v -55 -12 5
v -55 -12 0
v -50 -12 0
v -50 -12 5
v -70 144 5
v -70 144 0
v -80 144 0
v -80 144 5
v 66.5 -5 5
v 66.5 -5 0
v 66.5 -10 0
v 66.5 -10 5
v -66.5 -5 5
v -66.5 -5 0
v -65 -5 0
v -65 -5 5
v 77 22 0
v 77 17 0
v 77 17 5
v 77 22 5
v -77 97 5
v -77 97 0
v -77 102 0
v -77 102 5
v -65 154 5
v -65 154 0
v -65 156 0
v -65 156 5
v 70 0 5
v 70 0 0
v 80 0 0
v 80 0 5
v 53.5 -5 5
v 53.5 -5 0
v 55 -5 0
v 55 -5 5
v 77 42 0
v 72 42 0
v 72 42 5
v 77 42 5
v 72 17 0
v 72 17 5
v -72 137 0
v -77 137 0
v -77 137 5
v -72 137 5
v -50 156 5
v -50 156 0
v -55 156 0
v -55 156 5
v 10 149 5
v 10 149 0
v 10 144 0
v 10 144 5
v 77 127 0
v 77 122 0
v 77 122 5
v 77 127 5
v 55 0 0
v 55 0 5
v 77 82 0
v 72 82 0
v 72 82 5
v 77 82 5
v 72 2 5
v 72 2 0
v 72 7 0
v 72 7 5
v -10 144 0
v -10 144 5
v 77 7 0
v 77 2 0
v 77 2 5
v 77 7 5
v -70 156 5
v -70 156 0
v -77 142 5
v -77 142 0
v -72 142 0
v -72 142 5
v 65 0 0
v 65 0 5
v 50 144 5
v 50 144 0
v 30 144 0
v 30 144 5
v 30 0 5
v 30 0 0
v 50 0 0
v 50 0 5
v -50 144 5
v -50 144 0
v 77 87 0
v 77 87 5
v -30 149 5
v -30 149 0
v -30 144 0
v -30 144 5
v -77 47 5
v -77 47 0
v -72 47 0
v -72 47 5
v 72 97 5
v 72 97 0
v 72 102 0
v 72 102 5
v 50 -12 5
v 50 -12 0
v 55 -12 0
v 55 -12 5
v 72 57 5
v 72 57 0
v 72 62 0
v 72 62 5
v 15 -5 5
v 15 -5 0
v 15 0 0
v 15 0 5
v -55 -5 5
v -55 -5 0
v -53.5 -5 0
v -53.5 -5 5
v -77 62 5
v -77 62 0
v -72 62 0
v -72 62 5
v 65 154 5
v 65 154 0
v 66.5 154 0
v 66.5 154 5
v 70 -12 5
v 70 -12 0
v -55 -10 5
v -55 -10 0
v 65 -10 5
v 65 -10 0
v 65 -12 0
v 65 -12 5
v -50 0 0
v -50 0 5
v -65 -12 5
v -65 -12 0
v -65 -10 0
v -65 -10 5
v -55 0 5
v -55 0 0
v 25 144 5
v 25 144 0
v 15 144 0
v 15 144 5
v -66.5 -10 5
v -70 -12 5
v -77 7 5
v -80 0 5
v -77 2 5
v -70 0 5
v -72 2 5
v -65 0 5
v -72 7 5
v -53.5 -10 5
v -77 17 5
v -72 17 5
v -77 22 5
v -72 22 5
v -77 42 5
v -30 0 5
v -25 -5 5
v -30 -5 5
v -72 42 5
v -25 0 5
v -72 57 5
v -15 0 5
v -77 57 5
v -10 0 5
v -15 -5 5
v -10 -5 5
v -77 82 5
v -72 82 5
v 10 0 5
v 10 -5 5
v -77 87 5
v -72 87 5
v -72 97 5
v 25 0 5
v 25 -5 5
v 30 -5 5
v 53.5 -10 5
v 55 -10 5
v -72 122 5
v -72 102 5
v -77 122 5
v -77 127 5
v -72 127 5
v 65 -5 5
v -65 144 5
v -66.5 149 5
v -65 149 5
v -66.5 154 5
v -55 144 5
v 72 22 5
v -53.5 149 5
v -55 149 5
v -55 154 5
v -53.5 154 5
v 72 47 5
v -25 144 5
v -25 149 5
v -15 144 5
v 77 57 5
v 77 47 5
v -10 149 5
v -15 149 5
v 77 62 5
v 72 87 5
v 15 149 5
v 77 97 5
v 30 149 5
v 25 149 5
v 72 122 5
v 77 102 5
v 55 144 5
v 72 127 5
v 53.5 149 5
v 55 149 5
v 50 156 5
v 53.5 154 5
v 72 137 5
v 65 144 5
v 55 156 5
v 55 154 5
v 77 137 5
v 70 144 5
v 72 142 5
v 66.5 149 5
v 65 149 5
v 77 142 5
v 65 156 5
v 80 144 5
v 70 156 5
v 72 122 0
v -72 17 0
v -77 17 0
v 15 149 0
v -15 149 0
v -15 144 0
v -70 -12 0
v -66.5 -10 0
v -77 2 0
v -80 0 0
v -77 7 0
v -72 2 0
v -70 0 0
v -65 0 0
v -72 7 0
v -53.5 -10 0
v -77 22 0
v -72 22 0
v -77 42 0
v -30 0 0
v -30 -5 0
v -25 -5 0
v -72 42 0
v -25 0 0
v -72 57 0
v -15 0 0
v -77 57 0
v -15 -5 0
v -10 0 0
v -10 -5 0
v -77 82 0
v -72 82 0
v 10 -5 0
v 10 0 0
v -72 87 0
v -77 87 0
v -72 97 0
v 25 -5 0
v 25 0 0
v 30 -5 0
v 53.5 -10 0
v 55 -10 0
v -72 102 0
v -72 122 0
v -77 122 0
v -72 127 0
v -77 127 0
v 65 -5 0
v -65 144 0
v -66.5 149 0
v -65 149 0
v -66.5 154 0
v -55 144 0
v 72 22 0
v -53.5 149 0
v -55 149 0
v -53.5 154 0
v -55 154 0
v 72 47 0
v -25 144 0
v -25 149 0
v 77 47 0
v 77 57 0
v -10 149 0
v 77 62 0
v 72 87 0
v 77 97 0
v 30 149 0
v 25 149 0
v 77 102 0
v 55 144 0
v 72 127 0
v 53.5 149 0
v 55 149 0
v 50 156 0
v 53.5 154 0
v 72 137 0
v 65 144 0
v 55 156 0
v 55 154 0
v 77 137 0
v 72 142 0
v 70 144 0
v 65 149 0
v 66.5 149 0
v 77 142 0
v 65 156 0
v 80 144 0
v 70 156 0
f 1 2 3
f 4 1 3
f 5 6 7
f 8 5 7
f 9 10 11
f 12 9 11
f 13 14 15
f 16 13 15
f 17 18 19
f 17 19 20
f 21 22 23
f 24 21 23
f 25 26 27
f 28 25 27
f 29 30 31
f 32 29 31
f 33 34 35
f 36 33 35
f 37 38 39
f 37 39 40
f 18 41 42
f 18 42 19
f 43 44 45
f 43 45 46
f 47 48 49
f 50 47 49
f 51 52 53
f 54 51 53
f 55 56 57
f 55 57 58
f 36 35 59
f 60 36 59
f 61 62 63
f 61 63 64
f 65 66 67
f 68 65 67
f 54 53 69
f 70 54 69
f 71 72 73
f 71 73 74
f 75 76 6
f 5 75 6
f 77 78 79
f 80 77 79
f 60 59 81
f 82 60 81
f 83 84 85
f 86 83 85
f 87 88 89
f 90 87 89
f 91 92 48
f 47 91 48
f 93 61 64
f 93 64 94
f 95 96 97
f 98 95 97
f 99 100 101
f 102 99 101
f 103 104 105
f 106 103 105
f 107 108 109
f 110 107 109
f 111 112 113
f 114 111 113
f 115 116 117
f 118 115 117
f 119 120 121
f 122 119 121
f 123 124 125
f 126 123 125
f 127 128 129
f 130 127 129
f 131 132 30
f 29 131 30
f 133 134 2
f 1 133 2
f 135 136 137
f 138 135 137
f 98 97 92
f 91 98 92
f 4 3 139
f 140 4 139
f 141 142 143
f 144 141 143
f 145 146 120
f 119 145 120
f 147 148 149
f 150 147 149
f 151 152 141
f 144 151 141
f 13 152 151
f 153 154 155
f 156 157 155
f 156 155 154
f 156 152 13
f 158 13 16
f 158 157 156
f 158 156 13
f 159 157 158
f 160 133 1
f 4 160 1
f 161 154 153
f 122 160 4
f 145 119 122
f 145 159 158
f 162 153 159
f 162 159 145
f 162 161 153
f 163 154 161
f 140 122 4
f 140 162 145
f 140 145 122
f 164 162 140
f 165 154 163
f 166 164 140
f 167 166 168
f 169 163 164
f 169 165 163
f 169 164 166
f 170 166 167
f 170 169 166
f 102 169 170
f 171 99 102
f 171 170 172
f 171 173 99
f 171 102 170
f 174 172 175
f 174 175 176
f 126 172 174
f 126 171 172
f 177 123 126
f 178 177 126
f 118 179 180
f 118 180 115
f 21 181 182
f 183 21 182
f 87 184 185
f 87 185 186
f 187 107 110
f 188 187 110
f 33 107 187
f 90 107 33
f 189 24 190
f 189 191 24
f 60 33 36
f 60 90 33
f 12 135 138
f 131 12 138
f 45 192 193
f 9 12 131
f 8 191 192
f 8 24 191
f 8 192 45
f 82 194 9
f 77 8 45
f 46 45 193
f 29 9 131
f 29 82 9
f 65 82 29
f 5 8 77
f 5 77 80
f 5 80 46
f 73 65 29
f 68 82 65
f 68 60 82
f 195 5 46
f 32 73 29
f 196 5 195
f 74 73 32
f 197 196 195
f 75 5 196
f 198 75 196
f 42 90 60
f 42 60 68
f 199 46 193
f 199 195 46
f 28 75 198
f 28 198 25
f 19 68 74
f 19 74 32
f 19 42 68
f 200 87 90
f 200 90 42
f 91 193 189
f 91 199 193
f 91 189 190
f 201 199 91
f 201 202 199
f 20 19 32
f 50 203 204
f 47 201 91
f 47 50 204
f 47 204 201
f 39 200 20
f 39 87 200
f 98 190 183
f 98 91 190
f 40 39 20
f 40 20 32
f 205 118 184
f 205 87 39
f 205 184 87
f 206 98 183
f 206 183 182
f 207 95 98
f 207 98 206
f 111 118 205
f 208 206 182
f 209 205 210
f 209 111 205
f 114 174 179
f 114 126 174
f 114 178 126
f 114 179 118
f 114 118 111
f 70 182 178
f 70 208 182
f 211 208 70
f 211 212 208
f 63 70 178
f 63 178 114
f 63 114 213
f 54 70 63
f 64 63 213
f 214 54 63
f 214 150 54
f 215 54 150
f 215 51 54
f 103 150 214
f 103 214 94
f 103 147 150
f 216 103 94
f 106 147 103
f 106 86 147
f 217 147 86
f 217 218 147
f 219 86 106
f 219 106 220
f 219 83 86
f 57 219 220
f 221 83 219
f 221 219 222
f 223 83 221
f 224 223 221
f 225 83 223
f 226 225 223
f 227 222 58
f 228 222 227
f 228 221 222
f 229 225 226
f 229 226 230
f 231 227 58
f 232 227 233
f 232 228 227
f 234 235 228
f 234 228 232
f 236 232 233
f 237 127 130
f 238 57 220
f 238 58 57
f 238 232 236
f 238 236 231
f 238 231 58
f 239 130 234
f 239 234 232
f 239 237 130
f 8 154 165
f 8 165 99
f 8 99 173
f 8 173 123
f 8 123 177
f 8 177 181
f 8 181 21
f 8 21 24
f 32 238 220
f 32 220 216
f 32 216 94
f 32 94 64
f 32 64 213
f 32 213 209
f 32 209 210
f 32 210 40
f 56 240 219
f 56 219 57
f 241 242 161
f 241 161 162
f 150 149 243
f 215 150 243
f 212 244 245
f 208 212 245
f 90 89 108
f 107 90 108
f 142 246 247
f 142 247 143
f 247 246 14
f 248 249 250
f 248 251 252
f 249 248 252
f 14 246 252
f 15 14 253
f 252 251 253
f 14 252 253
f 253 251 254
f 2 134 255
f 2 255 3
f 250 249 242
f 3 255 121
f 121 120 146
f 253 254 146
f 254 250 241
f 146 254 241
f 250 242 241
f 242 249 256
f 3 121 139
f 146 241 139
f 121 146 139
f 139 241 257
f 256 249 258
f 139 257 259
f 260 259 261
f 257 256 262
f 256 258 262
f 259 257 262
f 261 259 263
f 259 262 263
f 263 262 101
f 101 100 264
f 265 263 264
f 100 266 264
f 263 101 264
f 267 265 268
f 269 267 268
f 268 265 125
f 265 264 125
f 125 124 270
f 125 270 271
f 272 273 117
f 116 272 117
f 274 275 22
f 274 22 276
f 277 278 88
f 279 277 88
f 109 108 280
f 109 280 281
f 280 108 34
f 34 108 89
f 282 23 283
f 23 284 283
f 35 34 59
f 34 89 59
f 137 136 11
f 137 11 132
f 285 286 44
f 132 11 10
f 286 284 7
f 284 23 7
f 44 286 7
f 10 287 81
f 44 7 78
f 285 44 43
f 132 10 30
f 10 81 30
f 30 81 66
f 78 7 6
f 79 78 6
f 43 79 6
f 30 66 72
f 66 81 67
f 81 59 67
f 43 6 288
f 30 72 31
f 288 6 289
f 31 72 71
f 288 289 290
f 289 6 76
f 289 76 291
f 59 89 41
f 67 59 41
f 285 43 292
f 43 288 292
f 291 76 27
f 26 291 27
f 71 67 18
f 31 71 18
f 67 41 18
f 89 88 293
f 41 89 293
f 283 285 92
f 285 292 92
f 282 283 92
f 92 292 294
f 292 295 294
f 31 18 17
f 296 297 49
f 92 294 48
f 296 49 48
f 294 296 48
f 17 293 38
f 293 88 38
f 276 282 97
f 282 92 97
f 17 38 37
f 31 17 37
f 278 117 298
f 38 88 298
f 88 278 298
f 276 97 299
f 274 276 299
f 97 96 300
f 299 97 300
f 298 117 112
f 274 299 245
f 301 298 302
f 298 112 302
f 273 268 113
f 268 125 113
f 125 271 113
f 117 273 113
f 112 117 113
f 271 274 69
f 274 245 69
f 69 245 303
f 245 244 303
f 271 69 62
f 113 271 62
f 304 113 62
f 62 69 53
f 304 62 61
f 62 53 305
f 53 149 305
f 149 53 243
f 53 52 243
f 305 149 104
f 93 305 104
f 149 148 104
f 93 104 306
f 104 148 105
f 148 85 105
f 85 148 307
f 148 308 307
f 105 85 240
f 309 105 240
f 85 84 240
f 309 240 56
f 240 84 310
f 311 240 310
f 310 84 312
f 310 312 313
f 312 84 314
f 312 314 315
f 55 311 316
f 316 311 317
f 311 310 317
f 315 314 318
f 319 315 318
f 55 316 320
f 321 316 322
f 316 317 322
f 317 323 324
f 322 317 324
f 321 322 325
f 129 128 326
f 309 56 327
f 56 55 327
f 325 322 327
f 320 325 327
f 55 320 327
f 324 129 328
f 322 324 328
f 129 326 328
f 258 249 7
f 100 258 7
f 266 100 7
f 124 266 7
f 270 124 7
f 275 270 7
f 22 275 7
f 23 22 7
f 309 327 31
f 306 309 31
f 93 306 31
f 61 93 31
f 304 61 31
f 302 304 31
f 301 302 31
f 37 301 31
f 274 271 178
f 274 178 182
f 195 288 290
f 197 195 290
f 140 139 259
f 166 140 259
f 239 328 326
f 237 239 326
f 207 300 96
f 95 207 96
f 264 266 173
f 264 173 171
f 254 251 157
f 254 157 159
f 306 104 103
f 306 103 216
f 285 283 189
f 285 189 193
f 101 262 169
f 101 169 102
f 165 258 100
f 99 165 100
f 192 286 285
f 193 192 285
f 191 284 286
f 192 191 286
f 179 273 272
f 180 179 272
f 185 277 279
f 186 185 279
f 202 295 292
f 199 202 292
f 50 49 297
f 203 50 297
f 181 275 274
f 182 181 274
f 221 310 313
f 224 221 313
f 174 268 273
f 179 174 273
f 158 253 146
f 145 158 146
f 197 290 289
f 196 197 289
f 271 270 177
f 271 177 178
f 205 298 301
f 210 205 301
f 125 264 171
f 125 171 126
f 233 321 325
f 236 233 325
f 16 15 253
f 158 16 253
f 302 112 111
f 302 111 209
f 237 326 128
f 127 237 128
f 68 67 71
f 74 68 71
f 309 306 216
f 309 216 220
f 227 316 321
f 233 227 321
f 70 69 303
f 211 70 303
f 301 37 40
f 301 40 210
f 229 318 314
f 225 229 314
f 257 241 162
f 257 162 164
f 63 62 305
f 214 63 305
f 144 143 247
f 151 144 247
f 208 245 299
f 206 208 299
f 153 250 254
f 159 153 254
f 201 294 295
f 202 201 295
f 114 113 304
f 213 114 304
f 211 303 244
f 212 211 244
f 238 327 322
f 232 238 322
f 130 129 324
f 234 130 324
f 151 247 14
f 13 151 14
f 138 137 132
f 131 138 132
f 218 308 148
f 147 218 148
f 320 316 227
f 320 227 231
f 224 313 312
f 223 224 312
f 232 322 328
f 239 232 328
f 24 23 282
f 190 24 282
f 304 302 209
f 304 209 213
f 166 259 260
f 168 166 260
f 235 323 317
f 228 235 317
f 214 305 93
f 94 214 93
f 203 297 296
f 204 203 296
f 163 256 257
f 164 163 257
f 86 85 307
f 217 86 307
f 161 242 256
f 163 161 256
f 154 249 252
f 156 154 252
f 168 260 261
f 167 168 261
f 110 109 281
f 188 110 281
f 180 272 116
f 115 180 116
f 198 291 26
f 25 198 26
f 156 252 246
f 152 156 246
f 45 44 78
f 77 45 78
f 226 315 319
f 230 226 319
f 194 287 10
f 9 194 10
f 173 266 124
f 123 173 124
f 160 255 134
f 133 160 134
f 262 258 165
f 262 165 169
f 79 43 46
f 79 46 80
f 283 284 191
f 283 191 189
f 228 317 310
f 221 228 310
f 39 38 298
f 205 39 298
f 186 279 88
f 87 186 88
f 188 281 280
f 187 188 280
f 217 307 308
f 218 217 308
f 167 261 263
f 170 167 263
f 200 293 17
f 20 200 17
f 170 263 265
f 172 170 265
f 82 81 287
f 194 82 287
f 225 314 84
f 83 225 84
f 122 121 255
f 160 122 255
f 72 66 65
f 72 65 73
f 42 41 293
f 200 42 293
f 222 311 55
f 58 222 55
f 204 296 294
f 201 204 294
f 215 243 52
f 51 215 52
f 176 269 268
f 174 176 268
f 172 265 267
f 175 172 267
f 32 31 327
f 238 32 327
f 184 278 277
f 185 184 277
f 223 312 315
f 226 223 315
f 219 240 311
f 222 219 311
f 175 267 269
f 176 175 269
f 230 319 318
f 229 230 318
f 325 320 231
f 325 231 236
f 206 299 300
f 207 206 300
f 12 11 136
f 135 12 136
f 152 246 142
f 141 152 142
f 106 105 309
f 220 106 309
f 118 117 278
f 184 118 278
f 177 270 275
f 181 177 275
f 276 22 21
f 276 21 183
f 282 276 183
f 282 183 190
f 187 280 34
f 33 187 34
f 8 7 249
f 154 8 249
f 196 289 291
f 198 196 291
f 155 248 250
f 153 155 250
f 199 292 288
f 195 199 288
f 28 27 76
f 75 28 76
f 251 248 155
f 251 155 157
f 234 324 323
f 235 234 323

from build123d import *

# Parameters (mm, degrees)
ESQUISSE1_W        = 5
ESQUISSE1_H        = 5
BOSS_EXTRU_1_DEPTH = 5


with BuildPart() as part:
    # Esquisse1 → Boss.-Extru.1 (new body)
    with BuildSketch(Plane.XY):
        Polygon((-70, 144), (-80, 144), (-80, 0), (-70, 0), (-70, -5), (-70, -12), (-65, -12), (-65, -10), (-66.5, -10), (-66.5, -5), (-65, -5), (-65, 0), (-60, 0), (-55, 0), (-55, -5), (-53.5, -5), (-53.5, -10), (-55, -10), (-55, -12), (-50, -12), (-50, -5), (-50, 0), (-30, 0), (-30, -5), (-25, -5), (-25, 0), (-20, 0), (-15, 0), (-15, -5), (-10, -5), (-10, 0), (10, 0), (10, -5), (15, -5), (15, 0), (20, 0), (25, 0), (25, -5), (30, -5), (30, 0), (50, 0), (50, -5), (50, -12), (55, -12), (55, -10), (53.5, -10), (53.5, -5), (55, -5), (55, 0), (60, 0), (65, 0), (65, -5), (66.5, -5), (66.5, -10), (65, -10), (65, -12), (70, -12), (70, -5), (70, 0), (80, 0), (80, 144), (70, 144), (70, 149), (70, 156), (65, 156), (65, 154), (66.5, 154), (66.5, 149), (65, 149), (65, 144), (60, 144), (55, 144), (55, 149), (53.5, 149), (53.5, 154), (55, 154), (55, 156), (50, 156), (50, 149), (50, 144), (30, 144), (30, 149), (25, 149), (25, 144), (20, 144), (15, 144), (15, 149), (10, 149), (10, 144), (-10, 144), (-10, 149), (-15, 149), (-15, 144), (-20, 144), (-25, 144), (-25, 149), (-30, 149), (-30, 144), (-50, 144), (-50, 149), (-50, 156), (-55, 156), (-55, 154), (-53.5, 154), (-53.5, 149), (-55, 149), (-55, 144), (-60, 144), (-65, 144), (-65, 149), (-66.5, 149), (-66.5, 154), (-65, 154), (-65, 156), (-70, 156), (-70, 149), align=None)
        with Locations((-74.5, 4.5)):
            Rectangle(ESQUISSE1_W, ESQUISSE1_H, mode=Mode.SUBTRACT)
        with Locations((-74.5, 19.5)):
            Rectangle(ESQUISSE1_W, ESQUISSE1_H, mode=Mode.SUBTRACT)
        with Locations((-74.5, 44.5)):
            Rectangle(ESQUISSE1_W, ESQUISSE1_H, mode=Mode.SUBTRACT)
        with Locations((-74.5, 59.5)):
            Rectangle(ESQUISSE1_W, ESQUISSE1_H, mode=Mode.SUBTRACT)
        with Locations((74.5, 4.5)):
            Rectangle(ESQUISSE1_W, ESQUISSE1_H, mode=Mode.SUBTRACT)
        with Locations((74.5, 19.5)):
            Rectangle(ESQUISSE1_W, ESQUISSE1_H, mode=Mode.SUBTRACT)
        with Locations((74.5, 44.5)):
            Rectangle(ESQUISSE1_W, ESQUISSE1_H, mode=Mode.SUBTRACT)
        with Locations((74.5, 59.5)):
            Rectangle(ESQUISSE1_W, ESQUISSE1_H, mode=Mode.SUBTRACT)
        with Locations((-74.5, 84.5)):
            Rectangle(ESQUISSE1_W, ESQUISSE1_H, mode=Mode.SUBTRACT)
        with Locations((-74.5, 99.5)):
            Rectangle(ESQUISSE1_W, ESQUISSE1_H, mode=Mode.SUBTRACT)
        with Locations((-74.5, 124.5)):
            Rectangle(ESQUISSE1_W, ESQUISSE1_H, mode=Mode.SUBTRACT)
        with Locations((-74.5, 139.5)):
            Rectangle(ESQUISSE1_W, ESQUISSE1_H, mode=Mode.SUBTRACT)
        with Locations((74.5, 84.5)):
            Rectangle(ESQUISSE1_W, ESQUISSE1_H, mode=Mode.SUBTRACT)
        with Locations((74.5, 99.5)):
            Rectangle(ESQUISSE1_W, ESQUISSE1_H, mode=Mode.SUBTRACT)
        with Locations((74.5, 124.5)):
            Rectangle(ESQUISSE1_W, ESQUISSE1_H, mode=Mode.SUBTRACT)
        with Locations((74.5, 139.5)):
            Rectangle(ESQUISSE1_W, ESQUISSE1_H, mode=Mode.SUBTRACT)
    extrude(amount=BOSS_EXTRU_1_DEPTH)


solid = part.part
